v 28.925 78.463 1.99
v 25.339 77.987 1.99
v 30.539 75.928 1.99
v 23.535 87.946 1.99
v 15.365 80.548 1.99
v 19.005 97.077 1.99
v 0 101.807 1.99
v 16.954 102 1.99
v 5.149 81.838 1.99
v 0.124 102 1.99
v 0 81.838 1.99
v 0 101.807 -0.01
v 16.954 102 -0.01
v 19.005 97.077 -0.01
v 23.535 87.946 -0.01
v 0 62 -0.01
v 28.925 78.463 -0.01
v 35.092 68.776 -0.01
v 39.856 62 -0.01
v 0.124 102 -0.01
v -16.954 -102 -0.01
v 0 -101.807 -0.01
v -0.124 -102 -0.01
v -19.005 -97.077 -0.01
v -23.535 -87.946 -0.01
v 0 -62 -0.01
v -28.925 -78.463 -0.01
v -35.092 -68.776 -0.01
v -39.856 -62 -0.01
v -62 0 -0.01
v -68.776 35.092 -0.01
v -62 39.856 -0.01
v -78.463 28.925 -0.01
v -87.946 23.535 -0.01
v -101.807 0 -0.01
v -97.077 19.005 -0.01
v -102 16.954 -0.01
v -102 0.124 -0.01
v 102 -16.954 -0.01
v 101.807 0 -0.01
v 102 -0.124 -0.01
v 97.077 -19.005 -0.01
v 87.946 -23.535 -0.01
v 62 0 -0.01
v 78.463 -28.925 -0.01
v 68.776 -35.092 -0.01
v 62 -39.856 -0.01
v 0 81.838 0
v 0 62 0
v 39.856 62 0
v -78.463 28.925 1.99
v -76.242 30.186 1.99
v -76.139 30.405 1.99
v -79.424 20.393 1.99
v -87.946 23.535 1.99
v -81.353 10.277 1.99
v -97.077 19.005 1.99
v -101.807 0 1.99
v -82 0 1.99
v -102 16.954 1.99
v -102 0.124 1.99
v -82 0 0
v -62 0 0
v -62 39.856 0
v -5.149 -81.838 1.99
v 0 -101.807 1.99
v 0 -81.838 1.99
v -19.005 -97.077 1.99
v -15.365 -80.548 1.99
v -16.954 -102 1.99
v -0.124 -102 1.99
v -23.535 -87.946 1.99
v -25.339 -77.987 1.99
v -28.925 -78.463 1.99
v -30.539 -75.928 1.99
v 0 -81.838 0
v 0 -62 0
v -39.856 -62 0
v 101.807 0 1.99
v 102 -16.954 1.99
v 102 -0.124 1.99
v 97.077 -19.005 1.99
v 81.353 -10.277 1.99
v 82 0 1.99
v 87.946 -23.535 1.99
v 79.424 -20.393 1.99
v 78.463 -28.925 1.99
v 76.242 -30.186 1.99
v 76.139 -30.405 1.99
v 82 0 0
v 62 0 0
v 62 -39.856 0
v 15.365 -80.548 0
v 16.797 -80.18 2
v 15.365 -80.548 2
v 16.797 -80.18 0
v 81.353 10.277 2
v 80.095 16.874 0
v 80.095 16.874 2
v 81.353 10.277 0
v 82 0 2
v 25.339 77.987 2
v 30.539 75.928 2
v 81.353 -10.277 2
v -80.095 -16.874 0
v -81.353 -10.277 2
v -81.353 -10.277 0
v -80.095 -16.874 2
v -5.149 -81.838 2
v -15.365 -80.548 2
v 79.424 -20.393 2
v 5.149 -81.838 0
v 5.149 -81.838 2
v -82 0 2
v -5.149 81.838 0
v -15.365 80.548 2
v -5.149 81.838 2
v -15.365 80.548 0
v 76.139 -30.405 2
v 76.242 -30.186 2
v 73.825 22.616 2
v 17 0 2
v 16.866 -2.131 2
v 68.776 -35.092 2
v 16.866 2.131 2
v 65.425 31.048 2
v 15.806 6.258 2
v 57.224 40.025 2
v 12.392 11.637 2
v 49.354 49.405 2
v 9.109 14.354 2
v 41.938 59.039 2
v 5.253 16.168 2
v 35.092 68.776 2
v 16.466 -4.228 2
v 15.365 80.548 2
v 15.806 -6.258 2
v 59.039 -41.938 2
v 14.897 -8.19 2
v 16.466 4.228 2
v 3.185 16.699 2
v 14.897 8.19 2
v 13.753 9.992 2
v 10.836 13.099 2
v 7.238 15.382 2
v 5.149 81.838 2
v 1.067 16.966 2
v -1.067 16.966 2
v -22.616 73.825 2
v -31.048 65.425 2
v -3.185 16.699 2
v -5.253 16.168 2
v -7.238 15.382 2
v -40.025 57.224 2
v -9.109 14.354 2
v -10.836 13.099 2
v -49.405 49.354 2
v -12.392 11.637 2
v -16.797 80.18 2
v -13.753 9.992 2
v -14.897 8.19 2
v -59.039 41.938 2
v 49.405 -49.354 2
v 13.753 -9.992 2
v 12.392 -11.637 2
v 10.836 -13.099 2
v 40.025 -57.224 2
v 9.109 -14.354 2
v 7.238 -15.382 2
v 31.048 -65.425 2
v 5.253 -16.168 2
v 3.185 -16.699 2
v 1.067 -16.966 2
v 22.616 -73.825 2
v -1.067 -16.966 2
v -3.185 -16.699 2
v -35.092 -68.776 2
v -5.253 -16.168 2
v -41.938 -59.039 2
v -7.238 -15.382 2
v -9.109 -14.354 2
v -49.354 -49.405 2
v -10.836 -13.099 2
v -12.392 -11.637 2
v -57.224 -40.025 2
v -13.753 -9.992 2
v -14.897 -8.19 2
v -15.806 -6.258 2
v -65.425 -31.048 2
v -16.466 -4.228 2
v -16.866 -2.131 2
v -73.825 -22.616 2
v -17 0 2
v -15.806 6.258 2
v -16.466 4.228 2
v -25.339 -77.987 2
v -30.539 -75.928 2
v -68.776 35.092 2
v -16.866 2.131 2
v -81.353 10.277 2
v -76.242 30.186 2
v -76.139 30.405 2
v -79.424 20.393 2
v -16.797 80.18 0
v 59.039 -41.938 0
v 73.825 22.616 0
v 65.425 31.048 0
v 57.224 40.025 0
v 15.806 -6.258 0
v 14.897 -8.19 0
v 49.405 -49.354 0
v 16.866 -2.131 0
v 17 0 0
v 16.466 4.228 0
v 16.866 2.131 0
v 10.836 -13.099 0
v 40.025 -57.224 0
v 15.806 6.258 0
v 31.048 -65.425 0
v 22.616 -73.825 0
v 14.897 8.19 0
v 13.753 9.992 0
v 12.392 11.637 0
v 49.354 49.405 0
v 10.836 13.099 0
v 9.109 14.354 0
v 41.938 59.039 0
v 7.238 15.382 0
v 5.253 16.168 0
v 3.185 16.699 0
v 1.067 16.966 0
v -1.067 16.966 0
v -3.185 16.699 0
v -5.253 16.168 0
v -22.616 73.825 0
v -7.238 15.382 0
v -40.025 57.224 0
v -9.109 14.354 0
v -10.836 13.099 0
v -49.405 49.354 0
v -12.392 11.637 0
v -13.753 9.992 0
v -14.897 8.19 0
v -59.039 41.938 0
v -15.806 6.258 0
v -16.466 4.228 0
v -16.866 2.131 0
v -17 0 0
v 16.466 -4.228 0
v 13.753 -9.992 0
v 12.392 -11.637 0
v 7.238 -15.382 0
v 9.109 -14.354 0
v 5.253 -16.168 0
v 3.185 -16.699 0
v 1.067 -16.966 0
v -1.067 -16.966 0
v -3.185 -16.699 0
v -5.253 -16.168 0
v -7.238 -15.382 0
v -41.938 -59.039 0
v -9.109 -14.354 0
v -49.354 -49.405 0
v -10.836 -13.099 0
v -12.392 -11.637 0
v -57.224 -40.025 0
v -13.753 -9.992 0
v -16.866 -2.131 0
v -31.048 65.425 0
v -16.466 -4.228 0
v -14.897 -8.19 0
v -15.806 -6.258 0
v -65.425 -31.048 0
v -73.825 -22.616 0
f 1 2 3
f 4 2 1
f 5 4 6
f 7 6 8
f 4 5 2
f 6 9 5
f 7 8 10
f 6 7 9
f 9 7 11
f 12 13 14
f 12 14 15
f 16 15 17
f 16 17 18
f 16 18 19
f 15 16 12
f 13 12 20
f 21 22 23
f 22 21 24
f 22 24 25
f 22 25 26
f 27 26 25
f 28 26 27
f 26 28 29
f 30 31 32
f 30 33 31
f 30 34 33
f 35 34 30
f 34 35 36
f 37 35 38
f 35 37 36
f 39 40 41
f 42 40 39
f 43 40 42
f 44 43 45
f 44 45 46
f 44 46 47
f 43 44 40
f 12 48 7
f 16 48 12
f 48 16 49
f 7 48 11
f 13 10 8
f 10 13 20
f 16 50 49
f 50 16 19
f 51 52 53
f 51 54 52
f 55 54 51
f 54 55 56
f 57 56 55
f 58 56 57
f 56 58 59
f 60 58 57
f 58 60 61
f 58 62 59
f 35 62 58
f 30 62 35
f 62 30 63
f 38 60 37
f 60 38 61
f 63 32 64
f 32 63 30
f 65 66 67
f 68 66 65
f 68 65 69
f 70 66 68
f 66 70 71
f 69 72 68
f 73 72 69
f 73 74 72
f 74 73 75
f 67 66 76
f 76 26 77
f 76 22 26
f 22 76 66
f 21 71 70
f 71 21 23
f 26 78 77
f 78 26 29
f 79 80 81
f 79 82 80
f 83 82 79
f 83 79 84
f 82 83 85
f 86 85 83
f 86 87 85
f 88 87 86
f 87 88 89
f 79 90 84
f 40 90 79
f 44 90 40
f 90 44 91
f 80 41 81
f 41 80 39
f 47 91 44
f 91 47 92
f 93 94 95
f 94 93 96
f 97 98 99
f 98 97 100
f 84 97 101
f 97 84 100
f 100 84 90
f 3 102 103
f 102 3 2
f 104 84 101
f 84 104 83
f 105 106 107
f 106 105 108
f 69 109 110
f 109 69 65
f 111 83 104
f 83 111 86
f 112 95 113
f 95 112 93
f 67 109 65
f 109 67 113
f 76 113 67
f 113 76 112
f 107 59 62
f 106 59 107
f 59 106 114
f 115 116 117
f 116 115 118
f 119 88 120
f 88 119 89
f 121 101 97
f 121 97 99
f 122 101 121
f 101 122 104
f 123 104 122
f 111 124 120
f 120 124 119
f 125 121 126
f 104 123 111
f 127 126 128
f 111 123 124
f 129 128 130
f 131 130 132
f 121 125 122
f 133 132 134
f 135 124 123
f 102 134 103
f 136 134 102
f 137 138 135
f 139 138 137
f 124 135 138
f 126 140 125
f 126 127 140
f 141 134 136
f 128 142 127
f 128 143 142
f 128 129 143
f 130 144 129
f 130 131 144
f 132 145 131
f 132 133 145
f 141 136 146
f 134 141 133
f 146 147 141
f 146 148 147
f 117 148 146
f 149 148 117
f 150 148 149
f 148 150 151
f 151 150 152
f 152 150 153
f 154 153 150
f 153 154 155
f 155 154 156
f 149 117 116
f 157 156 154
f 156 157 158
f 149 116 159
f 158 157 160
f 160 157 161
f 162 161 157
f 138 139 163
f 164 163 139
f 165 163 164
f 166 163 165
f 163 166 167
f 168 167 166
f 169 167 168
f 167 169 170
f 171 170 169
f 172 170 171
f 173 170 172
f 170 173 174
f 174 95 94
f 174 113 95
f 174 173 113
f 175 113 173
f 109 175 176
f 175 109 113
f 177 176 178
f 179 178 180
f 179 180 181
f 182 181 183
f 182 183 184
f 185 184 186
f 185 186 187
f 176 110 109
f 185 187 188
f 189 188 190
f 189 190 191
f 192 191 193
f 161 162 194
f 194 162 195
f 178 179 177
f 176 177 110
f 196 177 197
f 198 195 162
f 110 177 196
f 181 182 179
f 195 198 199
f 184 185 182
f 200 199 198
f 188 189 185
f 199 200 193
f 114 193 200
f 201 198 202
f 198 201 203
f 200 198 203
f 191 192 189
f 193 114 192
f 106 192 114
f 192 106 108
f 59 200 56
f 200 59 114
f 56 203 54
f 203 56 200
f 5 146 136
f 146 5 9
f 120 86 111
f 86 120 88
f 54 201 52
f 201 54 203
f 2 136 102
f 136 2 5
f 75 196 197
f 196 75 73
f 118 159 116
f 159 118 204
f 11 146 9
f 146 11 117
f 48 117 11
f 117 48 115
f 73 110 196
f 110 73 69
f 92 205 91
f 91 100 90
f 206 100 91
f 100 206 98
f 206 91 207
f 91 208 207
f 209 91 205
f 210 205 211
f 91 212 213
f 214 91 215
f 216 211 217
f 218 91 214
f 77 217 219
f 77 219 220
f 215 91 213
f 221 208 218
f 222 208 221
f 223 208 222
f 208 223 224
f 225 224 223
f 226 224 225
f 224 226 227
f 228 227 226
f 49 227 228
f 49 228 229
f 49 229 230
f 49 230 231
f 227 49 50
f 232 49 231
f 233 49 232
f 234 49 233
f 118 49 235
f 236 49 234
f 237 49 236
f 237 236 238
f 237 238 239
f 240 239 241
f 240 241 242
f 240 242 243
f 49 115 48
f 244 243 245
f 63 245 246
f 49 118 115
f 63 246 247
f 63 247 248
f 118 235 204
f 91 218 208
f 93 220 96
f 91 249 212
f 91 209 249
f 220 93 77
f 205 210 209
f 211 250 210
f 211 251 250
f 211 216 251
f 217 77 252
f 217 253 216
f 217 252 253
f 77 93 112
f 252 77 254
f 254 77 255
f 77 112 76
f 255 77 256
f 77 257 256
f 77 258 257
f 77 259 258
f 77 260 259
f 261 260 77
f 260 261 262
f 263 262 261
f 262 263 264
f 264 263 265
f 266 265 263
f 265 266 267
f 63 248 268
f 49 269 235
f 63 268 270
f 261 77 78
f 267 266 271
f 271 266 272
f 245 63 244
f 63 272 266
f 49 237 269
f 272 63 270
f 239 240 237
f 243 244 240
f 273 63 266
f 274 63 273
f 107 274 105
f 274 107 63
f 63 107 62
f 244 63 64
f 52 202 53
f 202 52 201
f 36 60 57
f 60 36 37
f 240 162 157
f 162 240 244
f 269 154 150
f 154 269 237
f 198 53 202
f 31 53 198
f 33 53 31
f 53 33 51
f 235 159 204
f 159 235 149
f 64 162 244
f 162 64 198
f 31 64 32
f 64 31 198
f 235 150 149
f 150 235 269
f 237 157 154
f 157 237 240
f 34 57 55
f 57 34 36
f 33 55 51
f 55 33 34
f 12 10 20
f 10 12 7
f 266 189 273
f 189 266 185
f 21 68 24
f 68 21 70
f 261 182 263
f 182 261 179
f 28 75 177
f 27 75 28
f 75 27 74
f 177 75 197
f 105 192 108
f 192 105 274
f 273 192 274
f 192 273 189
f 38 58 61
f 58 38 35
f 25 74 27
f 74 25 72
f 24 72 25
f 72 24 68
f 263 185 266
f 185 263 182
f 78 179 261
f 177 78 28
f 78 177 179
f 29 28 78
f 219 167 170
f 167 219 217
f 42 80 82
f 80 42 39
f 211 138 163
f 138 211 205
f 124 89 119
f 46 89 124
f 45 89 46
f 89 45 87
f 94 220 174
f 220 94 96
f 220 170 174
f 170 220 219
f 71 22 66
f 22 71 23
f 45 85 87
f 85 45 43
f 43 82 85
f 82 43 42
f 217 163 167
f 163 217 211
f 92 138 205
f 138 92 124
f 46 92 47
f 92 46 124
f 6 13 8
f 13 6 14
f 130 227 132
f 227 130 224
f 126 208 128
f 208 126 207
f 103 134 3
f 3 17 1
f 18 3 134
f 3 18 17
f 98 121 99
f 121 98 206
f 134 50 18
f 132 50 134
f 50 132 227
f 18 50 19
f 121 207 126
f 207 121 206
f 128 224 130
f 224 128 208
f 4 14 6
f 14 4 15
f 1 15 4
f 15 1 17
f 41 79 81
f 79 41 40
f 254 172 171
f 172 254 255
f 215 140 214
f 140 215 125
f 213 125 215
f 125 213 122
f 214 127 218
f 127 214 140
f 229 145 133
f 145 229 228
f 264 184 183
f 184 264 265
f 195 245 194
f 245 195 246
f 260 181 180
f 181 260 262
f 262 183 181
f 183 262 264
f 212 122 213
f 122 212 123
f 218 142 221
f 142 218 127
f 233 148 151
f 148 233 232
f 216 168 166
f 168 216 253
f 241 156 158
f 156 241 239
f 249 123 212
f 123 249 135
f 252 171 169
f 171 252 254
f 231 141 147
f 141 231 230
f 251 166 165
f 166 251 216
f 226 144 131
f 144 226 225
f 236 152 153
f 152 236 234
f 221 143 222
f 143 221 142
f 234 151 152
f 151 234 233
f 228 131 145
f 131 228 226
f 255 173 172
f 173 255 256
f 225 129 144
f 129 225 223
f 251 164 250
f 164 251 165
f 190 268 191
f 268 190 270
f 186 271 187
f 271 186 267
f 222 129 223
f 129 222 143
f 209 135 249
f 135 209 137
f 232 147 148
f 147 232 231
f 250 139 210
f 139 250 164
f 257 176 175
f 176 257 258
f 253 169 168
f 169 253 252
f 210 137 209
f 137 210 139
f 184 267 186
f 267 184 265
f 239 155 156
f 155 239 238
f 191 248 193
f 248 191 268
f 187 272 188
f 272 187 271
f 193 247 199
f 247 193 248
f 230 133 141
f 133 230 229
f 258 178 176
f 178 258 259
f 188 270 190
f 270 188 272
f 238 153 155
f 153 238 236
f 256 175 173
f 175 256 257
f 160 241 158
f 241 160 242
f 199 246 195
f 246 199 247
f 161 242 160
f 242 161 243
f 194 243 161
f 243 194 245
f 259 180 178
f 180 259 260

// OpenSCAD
// Crank cam

camFollowerWidth=45;

// Temp override
camFollowerWidth=2;

camFollowerRadius=20;

axleDia=34;

camCoreThickness=45;  // 2 * this plus axleDia == "base circle"
camLobeHeight=20;
camOuterDia=axleDia+camCoreThickness*2+camLobeHeight*2;

camLobeBackCutDia=65;
camLobeBackCutPrecessAngle=40;
camLobeBackCutAspectRatio=3;  // how wide to stretch the cut


numberOfLobes=4;


$fn=50;
overlap=0.01;

difference() {
    union() {
        cylinder(d=camOuterDia, h=camFollowerWidth);
        for (zRotation=[0:360/numberOfLobes:359]) {
            rotate([0,0,zRotation])
                translate([0,camOuterDia/2-camLobeHeight,-overlap])
                    camLobe();
        }
    }
    // axle
    translate([0,0,-overlap])
        cylinder(d=axleDia, h=camFollowerWidth+overlap*2);
    for (zRotation=[0:360/numberOfLobes:359]) {
        rotate([0,0,zRotation+camLobeBackCutPrecessAngle])
            translate([0,camOuterDia/2+camLobeHeight,-overlap])
                scale([3,1,1])
                cylinder(d=camLobeBackCutDia, h=camFollowerWidth+overlap*2);
    }
}

module camLobe() {
        cube([camLobeHeight*2,camLobeHeight*2,camFollowerWidth]);
}
